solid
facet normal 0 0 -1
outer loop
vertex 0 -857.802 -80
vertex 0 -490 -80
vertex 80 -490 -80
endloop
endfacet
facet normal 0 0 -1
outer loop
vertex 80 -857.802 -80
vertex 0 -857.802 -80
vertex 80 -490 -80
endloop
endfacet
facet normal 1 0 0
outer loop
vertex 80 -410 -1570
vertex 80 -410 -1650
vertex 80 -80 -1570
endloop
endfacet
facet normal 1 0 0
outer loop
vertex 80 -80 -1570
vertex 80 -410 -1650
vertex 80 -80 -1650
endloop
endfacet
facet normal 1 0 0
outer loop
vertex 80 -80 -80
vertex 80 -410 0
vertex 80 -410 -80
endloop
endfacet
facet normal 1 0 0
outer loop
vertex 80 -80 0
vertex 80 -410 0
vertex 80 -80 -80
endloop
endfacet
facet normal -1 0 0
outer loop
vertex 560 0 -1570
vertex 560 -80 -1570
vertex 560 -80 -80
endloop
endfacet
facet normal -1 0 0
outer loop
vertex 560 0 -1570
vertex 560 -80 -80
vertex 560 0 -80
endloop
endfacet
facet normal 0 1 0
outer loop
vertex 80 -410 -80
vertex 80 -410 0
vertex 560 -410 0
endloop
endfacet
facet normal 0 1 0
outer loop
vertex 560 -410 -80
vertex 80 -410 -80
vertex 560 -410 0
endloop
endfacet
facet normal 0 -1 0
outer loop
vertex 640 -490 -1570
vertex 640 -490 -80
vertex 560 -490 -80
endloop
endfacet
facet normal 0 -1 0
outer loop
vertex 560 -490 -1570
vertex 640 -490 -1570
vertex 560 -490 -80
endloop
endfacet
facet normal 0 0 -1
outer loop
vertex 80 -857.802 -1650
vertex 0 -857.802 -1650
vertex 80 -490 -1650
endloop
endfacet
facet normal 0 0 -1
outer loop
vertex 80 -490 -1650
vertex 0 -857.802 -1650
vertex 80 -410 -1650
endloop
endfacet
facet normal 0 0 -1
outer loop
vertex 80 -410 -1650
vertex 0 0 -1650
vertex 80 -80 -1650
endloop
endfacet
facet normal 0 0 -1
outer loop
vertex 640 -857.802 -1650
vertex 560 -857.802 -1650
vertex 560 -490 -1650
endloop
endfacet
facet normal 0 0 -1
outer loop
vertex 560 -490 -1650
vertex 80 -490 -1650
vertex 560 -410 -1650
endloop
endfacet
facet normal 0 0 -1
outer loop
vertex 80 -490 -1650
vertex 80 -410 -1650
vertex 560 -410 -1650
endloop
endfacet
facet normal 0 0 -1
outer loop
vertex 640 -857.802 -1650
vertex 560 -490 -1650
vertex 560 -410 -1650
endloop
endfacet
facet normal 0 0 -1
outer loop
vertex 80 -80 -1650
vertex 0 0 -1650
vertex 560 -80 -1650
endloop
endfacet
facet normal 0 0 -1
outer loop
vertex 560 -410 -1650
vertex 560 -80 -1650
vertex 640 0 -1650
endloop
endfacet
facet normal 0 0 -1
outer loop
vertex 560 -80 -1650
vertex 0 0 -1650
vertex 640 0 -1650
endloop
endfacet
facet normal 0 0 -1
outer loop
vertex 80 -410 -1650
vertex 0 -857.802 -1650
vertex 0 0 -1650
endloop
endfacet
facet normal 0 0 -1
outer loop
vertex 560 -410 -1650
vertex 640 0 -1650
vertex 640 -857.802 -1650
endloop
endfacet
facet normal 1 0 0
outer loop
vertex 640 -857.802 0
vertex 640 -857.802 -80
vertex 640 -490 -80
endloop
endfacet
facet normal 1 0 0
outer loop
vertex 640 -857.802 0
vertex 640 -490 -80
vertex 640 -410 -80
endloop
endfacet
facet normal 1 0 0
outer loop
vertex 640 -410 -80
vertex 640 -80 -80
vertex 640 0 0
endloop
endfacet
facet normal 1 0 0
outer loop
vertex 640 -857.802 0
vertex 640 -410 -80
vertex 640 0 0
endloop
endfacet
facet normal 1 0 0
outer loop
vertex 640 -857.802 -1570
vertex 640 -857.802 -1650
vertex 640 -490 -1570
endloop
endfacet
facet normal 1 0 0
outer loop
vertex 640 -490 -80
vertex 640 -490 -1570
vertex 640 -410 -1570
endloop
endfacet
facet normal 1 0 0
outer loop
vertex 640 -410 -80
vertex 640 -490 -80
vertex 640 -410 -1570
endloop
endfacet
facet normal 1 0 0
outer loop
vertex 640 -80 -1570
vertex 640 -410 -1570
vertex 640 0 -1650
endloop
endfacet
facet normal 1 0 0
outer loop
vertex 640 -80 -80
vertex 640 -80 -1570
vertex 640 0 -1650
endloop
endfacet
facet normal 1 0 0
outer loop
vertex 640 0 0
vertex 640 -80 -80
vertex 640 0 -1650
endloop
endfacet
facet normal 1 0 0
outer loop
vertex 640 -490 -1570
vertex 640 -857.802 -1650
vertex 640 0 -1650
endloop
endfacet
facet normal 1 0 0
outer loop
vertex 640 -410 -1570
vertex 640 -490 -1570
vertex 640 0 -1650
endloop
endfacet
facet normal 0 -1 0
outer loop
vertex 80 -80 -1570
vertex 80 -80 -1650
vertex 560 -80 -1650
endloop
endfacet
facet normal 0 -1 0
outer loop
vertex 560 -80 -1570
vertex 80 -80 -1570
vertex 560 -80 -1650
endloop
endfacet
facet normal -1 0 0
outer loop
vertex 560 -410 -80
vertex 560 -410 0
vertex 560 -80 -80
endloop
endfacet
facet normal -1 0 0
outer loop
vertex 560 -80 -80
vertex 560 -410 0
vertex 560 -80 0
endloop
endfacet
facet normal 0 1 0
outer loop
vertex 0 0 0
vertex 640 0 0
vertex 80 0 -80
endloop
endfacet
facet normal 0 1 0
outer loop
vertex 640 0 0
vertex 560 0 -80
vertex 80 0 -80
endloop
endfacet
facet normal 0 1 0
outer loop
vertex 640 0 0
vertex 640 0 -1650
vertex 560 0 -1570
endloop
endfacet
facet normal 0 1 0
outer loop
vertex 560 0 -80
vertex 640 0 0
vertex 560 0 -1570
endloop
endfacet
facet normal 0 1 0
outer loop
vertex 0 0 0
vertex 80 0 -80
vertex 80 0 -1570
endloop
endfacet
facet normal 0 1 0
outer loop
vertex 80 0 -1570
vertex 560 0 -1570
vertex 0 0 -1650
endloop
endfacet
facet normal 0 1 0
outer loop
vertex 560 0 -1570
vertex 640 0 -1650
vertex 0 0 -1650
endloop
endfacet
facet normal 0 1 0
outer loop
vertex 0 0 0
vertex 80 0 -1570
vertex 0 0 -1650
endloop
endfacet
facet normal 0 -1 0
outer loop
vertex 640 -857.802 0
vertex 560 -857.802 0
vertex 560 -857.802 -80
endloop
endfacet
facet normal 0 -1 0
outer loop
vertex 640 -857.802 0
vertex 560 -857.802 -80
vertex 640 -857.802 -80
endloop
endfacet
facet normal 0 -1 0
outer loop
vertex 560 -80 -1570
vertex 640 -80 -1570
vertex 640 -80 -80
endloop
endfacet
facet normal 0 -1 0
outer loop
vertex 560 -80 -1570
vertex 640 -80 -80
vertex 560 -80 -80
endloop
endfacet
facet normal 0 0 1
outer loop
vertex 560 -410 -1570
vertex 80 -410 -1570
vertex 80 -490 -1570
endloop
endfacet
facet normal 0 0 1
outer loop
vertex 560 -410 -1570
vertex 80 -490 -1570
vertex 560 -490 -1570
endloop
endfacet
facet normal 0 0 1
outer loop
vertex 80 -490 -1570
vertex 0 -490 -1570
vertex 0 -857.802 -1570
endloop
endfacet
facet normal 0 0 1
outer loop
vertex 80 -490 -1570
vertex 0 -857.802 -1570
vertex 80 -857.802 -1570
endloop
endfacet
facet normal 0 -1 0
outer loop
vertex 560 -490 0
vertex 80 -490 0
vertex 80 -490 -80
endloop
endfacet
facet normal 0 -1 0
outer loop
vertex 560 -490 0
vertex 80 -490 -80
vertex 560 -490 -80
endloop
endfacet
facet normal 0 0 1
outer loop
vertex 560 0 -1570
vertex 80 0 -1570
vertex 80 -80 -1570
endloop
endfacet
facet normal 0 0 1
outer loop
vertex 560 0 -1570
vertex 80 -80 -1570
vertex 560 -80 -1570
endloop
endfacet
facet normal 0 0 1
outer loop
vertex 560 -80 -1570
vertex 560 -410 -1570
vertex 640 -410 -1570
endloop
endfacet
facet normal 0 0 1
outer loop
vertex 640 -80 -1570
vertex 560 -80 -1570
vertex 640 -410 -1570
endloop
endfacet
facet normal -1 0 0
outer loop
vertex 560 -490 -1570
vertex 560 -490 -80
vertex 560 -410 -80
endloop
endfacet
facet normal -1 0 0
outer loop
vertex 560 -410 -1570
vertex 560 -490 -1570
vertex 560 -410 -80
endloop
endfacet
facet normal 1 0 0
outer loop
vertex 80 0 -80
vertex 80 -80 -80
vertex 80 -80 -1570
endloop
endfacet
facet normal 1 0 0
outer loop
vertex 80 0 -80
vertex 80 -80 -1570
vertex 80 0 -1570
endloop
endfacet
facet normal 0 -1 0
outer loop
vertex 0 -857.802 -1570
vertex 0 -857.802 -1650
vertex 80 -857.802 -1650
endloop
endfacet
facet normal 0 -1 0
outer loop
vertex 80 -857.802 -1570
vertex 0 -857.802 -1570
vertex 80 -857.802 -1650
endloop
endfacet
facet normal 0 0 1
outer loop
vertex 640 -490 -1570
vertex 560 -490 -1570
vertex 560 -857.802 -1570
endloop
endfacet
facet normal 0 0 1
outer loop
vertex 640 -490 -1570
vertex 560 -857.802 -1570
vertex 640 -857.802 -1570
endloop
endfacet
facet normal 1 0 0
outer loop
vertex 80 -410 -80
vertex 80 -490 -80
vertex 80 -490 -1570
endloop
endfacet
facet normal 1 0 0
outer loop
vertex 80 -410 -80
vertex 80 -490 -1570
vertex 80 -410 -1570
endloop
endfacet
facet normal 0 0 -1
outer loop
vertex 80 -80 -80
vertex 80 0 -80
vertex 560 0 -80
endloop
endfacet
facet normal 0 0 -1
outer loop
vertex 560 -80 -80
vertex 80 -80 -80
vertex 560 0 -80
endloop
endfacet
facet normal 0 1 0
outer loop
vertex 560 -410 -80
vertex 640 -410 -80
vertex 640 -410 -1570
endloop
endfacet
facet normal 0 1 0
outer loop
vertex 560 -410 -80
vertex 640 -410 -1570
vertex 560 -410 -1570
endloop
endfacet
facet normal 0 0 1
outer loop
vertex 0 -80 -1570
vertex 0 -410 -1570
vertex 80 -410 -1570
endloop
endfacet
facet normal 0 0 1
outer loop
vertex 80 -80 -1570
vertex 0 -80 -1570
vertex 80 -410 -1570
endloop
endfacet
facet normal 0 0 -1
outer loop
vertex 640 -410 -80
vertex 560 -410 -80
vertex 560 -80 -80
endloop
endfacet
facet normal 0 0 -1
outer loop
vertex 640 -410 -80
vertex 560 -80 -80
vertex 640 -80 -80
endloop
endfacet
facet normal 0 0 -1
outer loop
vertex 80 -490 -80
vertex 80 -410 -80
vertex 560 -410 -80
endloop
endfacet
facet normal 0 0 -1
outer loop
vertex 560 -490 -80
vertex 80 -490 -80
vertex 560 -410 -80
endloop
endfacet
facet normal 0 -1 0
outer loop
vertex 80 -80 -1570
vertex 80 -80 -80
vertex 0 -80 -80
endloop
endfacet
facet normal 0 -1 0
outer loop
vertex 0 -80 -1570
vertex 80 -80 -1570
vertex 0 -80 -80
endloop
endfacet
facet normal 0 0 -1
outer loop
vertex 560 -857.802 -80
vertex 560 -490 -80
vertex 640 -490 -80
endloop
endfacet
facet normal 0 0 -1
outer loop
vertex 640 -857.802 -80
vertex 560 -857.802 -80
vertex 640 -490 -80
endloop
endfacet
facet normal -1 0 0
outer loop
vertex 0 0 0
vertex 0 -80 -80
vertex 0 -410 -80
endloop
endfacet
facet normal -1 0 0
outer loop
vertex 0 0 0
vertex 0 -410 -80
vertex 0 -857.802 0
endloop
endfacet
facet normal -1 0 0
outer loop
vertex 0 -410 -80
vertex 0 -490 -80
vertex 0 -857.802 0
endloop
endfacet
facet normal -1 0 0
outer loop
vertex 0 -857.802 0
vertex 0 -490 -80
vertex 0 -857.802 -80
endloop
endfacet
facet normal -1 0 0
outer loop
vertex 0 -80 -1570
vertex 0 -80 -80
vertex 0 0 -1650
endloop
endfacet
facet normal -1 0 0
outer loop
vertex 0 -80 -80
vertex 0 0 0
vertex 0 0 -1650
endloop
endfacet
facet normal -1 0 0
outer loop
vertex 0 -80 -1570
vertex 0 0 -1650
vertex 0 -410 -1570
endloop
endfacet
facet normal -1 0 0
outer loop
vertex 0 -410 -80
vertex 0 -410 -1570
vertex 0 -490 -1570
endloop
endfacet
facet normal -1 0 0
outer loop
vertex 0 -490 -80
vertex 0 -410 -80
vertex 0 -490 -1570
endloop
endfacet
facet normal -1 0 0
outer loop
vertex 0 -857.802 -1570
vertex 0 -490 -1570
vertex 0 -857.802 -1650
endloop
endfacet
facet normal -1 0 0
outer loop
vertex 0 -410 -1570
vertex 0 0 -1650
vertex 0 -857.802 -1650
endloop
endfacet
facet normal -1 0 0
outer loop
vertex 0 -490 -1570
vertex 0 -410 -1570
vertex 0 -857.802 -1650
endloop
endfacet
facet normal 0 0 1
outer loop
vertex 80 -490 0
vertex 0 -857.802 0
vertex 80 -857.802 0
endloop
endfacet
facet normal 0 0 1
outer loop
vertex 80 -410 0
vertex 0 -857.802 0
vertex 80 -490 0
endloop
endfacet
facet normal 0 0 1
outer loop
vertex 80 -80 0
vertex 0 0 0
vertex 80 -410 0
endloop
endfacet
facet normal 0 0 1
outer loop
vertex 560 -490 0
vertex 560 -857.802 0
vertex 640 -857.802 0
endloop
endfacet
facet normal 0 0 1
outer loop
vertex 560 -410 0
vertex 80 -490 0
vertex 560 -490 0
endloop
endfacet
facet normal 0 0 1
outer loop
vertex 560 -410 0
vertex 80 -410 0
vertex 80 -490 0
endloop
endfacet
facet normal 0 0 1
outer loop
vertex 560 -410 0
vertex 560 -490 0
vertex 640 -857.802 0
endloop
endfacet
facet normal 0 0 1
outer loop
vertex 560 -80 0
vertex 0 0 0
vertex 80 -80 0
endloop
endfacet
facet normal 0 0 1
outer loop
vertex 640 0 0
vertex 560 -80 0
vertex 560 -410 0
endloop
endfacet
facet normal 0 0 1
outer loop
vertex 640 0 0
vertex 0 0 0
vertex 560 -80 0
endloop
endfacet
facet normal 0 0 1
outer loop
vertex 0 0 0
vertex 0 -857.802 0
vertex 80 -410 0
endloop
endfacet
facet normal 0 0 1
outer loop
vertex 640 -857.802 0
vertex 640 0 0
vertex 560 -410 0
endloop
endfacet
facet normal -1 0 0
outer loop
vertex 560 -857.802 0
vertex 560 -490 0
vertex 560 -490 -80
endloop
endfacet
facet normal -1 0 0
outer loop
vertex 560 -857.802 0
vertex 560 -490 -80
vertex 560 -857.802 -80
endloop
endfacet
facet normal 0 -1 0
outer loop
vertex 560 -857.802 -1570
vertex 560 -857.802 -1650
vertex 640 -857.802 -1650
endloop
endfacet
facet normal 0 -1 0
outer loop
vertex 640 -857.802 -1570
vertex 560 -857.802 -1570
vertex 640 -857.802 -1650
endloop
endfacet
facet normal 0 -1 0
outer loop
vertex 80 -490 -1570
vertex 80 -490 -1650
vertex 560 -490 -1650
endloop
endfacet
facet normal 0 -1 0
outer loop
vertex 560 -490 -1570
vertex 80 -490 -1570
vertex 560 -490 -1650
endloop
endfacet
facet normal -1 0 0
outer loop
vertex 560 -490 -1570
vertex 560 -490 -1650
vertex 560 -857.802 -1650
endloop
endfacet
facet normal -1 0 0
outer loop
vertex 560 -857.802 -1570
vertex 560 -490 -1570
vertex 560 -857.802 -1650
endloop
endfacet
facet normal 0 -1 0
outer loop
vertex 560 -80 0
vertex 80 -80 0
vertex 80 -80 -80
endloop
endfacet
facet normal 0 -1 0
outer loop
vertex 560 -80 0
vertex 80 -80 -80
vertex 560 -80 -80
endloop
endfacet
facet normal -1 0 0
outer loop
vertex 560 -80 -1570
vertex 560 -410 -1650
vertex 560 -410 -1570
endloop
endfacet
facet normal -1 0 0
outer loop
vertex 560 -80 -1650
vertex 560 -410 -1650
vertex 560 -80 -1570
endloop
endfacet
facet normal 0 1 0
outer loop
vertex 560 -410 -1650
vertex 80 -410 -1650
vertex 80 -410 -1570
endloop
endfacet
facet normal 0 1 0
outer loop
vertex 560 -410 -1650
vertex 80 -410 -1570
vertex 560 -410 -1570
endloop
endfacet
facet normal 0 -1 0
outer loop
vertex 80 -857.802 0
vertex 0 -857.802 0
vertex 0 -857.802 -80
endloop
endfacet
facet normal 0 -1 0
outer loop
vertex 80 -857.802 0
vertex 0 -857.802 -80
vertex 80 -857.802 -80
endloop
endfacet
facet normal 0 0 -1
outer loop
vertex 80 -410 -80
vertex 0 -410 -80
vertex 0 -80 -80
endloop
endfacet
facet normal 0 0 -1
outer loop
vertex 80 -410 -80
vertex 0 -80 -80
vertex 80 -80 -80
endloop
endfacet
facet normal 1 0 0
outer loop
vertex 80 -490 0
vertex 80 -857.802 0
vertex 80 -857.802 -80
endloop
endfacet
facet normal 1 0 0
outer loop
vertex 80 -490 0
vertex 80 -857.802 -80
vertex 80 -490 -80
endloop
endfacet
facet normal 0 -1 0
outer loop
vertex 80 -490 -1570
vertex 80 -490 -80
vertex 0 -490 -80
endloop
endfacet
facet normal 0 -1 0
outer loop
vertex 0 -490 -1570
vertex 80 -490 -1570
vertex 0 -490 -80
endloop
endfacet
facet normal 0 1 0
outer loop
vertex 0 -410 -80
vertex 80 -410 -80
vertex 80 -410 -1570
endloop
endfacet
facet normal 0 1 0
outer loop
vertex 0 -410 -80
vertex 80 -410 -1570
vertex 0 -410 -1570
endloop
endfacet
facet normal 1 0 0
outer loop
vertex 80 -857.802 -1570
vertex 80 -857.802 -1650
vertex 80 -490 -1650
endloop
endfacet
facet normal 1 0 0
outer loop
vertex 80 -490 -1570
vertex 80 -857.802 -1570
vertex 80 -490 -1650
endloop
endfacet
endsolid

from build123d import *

# Parameters (mm, degrees)
SKETCH1_W           = 480
SKETCH1_H           = 330
BOSS_EXTRUDE1_DEPTH = 80
SKETCH2_W           = 80
SKETCH2_H           = 80
BOSS_EXTRUDE2_DEPTH = 745


with BuildPart() as part:
    # Sketch1 → Boss-Extrude1 (new body)
    with BuildSketch(Plane.XY):
        Polygon((640, 0), (0, 0), (0, -857.8016), (80, -857.8016), (80, -490), (560, -490), (560, -857.8016), (640, -857.8016), align=None)
        with Locations((320, -245)):
            Rectangle(SKETCH1_W, SKETCH1_H, mode=Mode.SUBTRACT)
    boss_extrude1 = extrude(amount=-BOSS_EXTRUDE1_DEPTH)

    # Sketch2 → Boss-Extrude2 (add)
    with BuildSketch(Plane(origin=(0, 0, -80), x_dir=(-1, 0, 0), z_dir=(0, 0, -1))):
        with Locations((-600, -40)):
            Rectangle(SKETCH2_W, SKETCH2_H)
        with Locations((-40, -40)):
            Rectangle(SKETCH2_W, SKETCH2_H)
        with Locations((-600, -450)):
            Rectangle(SKETCH2_W, SKETCH2_H)
        with Locations((-40, -450)):
            Rectangle(SKETCH2_W, SKETCH2_H)
    boss_extrude2 = extrude(amount=BOSS_EXTRUDE2_DEPTH)

    # Mirror2: Boss-Extrude2 across plane
    add(boss_extrude2.mirror(Plane.XY.offset(-825)))

    # Mirror3: Boss-Extrude1 across plane
    add(boss_extrude1.mirror(Plane.XY.offset(-825)))


solid = part.part
